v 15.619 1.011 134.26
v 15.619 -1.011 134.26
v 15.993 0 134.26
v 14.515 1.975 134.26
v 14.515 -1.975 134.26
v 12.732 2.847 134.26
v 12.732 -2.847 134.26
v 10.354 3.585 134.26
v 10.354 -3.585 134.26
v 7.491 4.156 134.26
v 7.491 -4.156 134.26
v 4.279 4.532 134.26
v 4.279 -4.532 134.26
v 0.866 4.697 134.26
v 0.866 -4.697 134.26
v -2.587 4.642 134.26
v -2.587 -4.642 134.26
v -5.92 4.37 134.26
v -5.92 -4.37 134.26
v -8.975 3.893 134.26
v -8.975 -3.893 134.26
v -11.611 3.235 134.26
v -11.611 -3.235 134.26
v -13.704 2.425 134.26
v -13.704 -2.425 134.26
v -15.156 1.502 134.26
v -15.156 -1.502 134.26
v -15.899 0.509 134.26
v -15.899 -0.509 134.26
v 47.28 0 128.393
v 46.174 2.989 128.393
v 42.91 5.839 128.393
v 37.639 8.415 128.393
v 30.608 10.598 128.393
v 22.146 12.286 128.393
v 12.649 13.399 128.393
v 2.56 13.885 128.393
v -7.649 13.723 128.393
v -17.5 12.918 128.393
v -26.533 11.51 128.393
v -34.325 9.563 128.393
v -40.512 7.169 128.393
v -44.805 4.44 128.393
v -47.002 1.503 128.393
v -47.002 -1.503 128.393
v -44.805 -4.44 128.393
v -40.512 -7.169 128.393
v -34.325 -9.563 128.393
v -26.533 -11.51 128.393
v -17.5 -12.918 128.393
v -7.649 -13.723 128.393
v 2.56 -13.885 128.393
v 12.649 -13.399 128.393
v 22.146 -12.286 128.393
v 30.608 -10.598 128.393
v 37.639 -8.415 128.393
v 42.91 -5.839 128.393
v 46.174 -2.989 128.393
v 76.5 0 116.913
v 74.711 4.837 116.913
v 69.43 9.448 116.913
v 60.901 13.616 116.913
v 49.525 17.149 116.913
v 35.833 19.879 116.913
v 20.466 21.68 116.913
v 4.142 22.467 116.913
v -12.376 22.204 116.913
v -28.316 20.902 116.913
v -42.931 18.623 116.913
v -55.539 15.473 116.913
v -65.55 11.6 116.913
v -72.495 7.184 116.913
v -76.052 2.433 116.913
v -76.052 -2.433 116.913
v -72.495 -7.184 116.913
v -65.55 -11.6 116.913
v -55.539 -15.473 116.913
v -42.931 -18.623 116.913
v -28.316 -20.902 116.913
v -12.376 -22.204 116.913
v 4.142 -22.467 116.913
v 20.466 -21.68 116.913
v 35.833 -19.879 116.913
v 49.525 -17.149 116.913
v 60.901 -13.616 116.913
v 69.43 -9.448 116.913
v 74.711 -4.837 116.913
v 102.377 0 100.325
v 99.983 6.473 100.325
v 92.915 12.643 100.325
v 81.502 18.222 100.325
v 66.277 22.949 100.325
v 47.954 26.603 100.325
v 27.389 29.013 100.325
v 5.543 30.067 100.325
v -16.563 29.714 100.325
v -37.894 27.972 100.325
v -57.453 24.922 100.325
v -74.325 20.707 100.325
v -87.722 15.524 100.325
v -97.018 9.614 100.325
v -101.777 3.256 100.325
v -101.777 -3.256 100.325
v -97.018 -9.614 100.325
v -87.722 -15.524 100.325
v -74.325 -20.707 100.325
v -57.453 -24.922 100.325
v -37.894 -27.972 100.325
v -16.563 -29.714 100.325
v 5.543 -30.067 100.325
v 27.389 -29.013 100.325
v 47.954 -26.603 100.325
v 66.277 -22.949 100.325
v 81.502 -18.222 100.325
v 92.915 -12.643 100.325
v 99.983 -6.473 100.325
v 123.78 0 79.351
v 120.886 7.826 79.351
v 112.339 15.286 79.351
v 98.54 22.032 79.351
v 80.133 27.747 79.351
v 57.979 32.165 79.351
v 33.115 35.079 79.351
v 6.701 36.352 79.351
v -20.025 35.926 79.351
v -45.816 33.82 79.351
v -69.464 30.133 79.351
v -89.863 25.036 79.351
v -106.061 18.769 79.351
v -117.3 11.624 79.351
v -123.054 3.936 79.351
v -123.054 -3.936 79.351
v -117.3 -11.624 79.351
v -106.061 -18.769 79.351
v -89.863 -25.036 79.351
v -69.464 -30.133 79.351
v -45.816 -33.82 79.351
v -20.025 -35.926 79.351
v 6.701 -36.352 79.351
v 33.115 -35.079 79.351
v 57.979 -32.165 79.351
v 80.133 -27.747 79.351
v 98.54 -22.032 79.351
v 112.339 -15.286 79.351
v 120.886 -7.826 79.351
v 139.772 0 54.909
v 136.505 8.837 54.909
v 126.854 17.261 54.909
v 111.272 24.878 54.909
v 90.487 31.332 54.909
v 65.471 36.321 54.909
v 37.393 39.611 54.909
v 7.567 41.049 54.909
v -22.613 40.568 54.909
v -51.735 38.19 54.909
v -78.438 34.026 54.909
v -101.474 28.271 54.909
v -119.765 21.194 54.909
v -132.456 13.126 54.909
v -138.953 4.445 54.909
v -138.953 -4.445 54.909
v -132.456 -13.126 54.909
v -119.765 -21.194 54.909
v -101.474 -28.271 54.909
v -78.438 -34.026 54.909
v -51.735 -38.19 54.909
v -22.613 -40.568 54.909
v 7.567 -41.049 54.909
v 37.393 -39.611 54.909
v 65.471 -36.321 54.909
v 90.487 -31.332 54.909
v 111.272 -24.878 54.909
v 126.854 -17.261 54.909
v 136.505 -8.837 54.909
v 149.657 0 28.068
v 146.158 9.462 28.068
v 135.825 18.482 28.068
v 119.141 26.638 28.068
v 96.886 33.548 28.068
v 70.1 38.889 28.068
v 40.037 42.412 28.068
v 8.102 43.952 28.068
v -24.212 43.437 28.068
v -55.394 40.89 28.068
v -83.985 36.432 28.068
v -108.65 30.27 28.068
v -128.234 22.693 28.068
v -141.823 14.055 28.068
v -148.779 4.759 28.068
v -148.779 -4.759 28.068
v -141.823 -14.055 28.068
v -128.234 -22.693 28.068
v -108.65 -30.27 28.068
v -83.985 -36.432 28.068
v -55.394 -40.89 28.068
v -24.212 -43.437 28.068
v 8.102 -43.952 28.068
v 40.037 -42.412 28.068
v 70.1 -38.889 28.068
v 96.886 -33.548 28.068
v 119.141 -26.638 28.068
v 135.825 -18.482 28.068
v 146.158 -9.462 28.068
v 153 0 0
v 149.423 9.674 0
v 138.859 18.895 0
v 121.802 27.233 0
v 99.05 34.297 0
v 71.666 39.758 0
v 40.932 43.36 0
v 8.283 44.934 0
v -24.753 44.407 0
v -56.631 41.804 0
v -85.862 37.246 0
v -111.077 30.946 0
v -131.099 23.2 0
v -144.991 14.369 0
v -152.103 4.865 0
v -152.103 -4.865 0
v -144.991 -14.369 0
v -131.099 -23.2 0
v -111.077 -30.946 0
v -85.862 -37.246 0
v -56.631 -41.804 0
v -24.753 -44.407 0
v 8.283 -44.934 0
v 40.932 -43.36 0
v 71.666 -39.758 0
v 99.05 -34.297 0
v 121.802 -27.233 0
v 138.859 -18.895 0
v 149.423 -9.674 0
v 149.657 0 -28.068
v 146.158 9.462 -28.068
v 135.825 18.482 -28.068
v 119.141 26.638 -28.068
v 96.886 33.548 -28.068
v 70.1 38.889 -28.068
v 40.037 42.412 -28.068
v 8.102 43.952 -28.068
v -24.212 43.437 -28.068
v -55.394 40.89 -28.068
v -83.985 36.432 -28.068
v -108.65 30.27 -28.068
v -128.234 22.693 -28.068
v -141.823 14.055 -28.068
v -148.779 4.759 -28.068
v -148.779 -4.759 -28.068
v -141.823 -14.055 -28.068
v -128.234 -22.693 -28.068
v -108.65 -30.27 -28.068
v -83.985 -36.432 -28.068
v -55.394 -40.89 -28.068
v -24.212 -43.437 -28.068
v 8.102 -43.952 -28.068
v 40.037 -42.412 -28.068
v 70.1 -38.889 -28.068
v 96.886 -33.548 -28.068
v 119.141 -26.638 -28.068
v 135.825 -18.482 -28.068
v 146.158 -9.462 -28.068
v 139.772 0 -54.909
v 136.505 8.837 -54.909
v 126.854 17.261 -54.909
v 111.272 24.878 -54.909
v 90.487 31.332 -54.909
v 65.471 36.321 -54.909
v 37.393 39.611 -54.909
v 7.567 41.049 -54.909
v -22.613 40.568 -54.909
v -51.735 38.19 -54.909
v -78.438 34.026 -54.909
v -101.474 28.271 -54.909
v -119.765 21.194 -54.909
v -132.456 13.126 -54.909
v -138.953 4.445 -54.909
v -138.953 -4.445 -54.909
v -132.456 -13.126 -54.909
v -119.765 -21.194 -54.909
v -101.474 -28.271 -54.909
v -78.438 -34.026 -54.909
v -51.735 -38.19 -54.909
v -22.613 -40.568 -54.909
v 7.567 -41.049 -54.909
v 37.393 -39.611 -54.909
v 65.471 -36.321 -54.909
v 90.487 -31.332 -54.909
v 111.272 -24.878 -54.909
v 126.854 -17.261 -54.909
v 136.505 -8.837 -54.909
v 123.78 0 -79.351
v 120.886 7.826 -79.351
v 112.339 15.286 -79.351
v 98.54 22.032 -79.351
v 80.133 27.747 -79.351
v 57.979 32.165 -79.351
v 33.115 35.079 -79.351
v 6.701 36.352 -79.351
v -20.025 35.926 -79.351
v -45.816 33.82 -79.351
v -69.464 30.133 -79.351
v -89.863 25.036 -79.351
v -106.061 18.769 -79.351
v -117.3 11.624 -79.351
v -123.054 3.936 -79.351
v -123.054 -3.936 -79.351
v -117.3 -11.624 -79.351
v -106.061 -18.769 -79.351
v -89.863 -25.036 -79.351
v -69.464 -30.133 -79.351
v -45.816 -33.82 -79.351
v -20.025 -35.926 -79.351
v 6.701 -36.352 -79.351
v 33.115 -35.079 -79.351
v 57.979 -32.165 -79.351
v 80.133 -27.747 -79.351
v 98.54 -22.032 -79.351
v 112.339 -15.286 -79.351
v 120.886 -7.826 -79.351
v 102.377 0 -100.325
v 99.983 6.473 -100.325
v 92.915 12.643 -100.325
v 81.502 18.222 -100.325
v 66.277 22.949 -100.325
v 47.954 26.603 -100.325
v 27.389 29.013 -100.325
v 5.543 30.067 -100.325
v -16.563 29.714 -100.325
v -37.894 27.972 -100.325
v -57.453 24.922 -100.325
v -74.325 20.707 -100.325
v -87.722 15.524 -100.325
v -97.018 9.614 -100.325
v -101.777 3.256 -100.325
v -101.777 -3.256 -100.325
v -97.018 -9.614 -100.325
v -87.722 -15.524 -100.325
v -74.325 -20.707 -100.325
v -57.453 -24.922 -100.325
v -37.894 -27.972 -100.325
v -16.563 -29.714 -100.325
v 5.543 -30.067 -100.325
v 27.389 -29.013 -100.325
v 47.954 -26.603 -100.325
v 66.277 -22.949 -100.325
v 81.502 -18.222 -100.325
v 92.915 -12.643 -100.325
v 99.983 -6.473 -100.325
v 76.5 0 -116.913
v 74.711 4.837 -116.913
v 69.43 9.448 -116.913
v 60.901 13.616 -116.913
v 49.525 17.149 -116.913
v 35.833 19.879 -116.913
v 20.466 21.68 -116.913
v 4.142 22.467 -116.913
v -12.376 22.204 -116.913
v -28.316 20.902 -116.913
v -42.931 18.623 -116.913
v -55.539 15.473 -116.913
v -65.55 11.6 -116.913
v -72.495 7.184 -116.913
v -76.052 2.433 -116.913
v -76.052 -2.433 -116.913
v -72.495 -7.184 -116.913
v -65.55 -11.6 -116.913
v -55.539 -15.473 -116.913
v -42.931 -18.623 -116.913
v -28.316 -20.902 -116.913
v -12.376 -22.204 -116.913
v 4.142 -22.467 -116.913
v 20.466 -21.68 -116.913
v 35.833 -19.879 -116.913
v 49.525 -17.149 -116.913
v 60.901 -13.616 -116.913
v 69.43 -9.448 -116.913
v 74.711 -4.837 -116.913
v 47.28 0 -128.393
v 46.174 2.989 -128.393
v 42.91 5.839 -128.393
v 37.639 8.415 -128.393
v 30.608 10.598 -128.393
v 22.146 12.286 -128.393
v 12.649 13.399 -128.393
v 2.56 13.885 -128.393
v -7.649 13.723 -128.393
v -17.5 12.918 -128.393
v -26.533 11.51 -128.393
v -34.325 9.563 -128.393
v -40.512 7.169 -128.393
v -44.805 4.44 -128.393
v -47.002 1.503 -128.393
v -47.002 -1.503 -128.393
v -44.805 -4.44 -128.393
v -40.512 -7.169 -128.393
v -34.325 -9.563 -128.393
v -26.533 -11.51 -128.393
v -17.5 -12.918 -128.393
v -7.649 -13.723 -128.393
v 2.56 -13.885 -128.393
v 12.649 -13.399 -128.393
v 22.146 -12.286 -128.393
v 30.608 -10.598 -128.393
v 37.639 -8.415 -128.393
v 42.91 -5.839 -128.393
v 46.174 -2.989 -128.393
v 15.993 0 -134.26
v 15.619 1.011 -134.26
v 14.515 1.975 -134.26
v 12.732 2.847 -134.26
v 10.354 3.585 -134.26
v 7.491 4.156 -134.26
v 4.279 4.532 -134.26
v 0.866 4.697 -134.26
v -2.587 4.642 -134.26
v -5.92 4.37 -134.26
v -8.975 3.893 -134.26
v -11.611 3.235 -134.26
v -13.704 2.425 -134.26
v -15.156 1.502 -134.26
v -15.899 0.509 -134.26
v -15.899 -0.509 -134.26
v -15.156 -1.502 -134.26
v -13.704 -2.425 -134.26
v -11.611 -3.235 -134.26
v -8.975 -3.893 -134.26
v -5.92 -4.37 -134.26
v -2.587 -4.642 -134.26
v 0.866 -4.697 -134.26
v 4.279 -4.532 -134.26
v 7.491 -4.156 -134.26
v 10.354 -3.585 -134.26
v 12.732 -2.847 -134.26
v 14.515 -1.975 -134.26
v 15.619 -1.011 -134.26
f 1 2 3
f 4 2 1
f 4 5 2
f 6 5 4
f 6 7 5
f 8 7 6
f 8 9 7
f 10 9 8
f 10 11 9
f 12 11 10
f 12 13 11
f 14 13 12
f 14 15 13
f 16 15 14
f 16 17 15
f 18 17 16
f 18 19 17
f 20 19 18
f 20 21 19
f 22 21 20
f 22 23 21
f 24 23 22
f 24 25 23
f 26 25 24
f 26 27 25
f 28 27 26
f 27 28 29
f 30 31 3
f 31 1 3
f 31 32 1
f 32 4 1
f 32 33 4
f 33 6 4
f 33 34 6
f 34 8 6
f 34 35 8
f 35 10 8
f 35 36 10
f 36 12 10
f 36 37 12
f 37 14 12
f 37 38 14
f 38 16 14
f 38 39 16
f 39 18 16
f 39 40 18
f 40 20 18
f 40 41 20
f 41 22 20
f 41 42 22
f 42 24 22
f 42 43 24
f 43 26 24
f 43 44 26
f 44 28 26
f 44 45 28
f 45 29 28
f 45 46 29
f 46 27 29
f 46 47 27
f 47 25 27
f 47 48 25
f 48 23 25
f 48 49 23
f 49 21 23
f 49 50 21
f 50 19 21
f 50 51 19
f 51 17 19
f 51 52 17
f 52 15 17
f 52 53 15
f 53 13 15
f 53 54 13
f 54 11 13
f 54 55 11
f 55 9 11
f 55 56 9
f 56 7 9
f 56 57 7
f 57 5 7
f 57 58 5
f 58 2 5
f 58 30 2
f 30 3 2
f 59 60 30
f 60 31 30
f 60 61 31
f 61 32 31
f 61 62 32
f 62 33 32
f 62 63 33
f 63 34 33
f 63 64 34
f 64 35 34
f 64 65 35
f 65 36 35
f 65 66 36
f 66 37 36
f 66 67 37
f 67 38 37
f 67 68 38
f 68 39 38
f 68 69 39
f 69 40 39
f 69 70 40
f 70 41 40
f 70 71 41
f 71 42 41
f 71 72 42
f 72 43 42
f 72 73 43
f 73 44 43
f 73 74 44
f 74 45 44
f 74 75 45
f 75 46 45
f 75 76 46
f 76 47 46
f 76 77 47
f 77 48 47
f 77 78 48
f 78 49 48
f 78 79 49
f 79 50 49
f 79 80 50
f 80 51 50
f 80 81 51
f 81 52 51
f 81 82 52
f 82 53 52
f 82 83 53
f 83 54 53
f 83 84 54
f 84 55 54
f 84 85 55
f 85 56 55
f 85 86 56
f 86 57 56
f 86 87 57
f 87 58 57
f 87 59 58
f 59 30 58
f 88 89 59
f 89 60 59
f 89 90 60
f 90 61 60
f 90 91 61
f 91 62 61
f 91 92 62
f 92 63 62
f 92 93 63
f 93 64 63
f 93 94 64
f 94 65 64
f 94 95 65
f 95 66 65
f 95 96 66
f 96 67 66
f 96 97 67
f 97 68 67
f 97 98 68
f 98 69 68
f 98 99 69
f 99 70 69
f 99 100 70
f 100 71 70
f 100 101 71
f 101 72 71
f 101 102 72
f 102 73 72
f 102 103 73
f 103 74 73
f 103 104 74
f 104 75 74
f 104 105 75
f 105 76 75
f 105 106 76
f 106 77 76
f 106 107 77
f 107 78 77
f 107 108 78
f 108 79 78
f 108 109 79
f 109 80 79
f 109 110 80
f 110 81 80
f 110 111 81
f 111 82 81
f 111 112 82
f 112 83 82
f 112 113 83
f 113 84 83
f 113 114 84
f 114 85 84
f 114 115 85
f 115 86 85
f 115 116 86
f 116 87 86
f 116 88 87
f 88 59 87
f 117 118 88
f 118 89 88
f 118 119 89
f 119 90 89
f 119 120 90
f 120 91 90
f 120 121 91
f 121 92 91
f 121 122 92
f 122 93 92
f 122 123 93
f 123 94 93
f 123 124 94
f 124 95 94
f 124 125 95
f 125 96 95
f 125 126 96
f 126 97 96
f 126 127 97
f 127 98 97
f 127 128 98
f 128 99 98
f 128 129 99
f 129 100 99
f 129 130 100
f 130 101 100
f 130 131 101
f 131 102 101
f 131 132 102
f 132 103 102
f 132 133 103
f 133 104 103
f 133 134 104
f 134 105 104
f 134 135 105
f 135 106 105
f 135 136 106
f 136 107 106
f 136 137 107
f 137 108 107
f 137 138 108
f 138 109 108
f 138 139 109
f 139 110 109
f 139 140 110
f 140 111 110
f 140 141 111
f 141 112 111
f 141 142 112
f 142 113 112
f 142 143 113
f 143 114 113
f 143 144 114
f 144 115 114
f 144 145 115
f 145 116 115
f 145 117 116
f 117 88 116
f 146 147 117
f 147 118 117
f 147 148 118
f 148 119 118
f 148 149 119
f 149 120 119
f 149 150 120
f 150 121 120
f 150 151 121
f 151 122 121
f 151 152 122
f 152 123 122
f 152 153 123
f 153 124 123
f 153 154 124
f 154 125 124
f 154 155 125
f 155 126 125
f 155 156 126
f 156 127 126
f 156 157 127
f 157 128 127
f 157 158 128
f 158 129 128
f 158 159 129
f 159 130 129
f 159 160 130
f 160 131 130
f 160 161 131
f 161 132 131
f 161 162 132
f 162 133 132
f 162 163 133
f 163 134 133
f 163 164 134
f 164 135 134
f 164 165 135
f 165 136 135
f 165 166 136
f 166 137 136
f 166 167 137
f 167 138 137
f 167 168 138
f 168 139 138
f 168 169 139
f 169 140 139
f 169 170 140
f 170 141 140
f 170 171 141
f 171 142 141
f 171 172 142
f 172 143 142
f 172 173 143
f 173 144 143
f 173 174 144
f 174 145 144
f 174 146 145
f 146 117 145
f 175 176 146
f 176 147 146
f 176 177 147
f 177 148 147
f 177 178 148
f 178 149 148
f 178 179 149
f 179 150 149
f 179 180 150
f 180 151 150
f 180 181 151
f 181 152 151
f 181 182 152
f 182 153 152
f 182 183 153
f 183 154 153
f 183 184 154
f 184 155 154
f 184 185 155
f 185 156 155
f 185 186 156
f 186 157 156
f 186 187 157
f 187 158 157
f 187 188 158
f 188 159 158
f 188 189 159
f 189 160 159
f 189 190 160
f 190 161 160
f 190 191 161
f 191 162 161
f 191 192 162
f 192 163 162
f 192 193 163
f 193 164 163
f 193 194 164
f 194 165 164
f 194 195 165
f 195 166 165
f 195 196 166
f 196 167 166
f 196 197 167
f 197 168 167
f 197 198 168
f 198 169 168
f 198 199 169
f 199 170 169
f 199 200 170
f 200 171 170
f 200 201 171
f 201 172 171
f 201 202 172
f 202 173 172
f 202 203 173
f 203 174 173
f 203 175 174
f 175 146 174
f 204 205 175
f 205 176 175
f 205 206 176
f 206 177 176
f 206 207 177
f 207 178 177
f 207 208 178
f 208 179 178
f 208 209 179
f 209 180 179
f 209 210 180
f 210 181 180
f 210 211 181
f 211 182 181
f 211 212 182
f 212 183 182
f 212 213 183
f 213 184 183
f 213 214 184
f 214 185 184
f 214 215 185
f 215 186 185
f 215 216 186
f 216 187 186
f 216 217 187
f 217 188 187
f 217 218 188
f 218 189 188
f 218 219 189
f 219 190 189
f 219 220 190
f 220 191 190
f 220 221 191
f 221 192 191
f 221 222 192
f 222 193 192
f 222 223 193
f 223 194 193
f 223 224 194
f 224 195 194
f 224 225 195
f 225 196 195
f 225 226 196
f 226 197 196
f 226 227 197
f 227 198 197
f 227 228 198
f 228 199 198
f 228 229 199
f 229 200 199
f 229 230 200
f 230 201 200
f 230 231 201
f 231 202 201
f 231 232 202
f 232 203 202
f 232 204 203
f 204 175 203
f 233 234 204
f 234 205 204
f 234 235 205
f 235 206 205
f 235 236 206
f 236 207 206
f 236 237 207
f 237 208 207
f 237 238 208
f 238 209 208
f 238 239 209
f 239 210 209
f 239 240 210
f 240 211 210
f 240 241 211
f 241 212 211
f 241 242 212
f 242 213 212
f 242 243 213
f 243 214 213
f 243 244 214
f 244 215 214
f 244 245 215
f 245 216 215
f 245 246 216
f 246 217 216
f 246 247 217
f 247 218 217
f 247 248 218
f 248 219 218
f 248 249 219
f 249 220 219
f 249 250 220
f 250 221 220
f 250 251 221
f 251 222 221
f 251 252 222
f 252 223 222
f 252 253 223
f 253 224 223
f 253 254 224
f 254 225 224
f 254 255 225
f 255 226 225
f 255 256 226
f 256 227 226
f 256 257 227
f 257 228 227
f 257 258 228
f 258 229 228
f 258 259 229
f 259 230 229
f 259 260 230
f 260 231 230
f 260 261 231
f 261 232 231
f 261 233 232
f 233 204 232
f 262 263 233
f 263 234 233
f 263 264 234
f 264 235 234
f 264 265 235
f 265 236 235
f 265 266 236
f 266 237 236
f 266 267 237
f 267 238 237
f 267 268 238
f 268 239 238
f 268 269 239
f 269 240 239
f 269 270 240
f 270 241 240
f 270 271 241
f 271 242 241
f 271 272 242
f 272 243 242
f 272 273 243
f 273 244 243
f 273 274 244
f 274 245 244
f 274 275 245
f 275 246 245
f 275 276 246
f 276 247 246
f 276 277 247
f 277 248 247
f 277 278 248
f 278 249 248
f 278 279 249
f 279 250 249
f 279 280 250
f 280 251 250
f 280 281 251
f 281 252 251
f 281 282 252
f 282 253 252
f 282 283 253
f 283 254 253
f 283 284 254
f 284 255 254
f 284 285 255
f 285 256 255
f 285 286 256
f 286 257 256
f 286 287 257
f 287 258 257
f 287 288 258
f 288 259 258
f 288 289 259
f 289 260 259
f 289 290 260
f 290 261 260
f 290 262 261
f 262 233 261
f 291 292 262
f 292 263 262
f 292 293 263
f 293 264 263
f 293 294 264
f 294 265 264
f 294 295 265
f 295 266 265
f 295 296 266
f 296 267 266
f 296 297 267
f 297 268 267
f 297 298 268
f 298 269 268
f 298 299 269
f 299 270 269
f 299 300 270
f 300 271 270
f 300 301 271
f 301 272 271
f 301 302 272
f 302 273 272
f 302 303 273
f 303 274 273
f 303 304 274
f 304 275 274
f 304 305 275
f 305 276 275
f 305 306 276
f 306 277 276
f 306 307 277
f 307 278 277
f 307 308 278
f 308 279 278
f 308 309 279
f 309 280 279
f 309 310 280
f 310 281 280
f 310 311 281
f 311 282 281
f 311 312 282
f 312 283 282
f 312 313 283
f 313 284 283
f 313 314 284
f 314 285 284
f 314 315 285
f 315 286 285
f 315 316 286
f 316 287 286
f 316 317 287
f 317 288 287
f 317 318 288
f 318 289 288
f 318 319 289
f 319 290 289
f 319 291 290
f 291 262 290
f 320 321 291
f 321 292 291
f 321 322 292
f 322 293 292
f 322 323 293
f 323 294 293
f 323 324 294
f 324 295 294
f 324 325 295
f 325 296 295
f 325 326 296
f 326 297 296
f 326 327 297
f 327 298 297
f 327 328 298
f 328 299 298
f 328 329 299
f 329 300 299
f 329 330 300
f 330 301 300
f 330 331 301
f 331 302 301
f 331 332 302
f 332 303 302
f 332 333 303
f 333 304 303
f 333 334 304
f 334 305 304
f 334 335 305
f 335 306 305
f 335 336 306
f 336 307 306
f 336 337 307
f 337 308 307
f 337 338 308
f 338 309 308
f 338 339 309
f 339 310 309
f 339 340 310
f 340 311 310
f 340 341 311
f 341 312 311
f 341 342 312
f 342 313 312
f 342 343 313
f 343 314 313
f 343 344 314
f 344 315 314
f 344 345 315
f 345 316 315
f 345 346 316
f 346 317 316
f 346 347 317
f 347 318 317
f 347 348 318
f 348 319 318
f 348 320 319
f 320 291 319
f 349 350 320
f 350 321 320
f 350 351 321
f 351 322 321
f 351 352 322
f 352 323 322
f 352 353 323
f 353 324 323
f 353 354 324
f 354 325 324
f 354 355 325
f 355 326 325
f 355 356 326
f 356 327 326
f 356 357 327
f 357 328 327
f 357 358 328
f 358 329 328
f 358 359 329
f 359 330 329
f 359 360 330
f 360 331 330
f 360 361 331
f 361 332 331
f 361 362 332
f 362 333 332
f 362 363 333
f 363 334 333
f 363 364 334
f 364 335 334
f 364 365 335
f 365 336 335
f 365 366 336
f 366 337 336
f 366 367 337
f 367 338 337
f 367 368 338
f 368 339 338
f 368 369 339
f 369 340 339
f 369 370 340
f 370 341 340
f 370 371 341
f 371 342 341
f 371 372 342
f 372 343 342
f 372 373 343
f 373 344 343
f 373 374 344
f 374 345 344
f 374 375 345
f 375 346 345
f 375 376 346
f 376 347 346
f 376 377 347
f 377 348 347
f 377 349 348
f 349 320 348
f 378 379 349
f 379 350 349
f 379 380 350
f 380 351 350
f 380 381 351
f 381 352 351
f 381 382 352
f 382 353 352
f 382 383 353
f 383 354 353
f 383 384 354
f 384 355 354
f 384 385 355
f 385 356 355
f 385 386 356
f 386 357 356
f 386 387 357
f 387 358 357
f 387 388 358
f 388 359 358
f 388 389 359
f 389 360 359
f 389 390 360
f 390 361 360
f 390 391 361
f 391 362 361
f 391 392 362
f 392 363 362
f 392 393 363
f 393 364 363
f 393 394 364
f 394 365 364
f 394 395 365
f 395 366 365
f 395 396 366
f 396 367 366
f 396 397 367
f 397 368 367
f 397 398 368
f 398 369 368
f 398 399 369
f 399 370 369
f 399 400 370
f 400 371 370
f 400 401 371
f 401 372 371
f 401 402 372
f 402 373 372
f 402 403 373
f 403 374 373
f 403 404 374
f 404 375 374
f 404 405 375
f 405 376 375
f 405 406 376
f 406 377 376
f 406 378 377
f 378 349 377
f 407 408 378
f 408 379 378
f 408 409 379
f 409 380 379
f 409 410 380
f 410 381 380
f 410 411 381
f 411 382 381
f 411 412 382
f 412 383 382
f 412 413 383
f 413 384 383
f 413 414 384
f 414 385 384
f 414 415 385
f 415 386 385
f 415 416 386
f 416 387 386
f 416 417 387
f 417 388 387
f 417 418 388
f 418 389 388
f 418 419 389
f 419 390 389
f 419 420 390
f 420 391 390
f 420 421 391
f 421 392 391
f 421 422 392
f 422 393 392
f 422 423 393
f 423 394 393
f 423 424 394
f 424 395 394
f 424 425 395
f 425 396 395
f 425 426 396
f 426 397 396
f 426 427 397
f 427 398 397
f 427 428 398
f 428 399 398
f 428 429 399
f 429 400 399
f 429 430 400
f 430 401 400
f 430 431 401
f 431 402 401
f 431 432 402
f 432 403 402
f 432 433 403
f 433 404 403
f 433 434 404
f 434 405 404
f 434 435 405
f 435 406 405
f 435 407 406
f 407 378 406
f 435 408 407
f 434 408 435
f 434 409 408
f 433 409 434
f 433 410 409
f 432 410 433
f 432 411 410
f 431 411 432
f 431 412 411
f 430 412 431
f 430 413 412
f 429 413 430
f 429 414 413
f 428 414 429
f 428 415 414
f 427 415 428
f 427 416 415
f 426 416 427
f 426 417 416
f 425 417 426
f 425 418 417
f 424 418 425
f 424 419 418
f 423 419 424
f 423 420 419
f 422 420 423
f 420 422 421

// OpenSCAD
// Generated by SolidPython 1.0.1 on 2020-07-29 00:46:52


scale(v = [17, 5, 15]) {
	sphere(r = 9);
}
/***********************************************
*********      SolidPython code:      **********
************************************************
 
# import packages: SolidPython
from solid import *
from solid.utils import *
from itertools import chain, combinations, permutations


class Resize:

    def __init__(self, scad_file):
        self.scad_file = scad_file
        #self.scad_file = import_scad(scad_file)
        # cone/cylinder param:
        self.r1 = 0
        self.r2 = 0
        self.h = 0
        # rectangular prism param:
        self.w = 0
        self.l = 0
        # ellipse param:
        self.r = 0

    # import OpenScad code (file name corresponds to shape)


    # classify shape + parameters
    def assign(self, param1, param2, param3):
        if self.scad_file == 'cone.scad':
            self.r1 = param1
            self.r2 = param2
            self.h = param3
        elif self.scad_file == 'cylinder.scad':
            self.r1 = param1
            self.r2 = param2
            self.h = param3
        elif self.scad_file == 'rectangularPrism.scad':
            self.h = param1
            self.l = param2
            self.w = param3
        else:
            self.r = param1
            self.h = param2

    # resize parameters
    def iterate(self):
        x = range(3, 20, 2)
        i = 1
        if self.scad_file == 'cone.scad':
            tempList = list(permutations(x, 2))
            for temp in tempList:
                param1 = temp[0]
                param2 = temp[1]
                filepath = 'produced_scad_files/' + 'cone' + str(param1) + '_' + str(param2) + '_' + '.scad'
                scad_render_to_file(cylinder(h=param1, r1=param2, r2=0), filepath)

        elif self.scad_file == 'cylinder.scad':
            tempList = list(permutations(x, 3))
            for temp in tempList:
                param1 = temp[0]
                param2 = temp[1]
                filepath = 'produced_scad_files/' + 'cylinder' + str(param1) + '_' + str(param2) + '_' + '.scad'
                scad_render_to_file(cylinder(h=param1, r1=param2, r2=param2), filepath)

        elif self.scad_file == 'rectangularPrism.scad':
            tempList = list(permutations(x, 3))
            for temp in tempList:
                param1 = temp[0]
                param2 = temp[1]
                param3 = temp[2]
                filepath = 'produced_scad_files/' + 'rectangularPrism' + str(param1) + '_' + str(param2) + '_' + str(
                    param3) + '.scad'
                scad_render_to_file(cube(size=(param1, param2, param3)), filepath)

        elif self.scad_file == 'ellipse.scad':
            tempList = list(permutations(x, 4))
            for temp in tempList:
                param1 = temp[0]
                param2 = temp[1]
                param3 = temp[2]
                param4 = temp[3]
                filepath = 'produced_scad_files/' + 'ellipse' + str(param1) + '_' + str(param2) + '_' + str(param3) + '_' + str(param4) + '.scad'
                scad_render_to_file(scale([param1, param2, param3])(sphere(r=param4)), filepath)

    def render_to_scadfile(self):
        scad_render_to_file(scad, 'example.scad') 
 
************************************************/
